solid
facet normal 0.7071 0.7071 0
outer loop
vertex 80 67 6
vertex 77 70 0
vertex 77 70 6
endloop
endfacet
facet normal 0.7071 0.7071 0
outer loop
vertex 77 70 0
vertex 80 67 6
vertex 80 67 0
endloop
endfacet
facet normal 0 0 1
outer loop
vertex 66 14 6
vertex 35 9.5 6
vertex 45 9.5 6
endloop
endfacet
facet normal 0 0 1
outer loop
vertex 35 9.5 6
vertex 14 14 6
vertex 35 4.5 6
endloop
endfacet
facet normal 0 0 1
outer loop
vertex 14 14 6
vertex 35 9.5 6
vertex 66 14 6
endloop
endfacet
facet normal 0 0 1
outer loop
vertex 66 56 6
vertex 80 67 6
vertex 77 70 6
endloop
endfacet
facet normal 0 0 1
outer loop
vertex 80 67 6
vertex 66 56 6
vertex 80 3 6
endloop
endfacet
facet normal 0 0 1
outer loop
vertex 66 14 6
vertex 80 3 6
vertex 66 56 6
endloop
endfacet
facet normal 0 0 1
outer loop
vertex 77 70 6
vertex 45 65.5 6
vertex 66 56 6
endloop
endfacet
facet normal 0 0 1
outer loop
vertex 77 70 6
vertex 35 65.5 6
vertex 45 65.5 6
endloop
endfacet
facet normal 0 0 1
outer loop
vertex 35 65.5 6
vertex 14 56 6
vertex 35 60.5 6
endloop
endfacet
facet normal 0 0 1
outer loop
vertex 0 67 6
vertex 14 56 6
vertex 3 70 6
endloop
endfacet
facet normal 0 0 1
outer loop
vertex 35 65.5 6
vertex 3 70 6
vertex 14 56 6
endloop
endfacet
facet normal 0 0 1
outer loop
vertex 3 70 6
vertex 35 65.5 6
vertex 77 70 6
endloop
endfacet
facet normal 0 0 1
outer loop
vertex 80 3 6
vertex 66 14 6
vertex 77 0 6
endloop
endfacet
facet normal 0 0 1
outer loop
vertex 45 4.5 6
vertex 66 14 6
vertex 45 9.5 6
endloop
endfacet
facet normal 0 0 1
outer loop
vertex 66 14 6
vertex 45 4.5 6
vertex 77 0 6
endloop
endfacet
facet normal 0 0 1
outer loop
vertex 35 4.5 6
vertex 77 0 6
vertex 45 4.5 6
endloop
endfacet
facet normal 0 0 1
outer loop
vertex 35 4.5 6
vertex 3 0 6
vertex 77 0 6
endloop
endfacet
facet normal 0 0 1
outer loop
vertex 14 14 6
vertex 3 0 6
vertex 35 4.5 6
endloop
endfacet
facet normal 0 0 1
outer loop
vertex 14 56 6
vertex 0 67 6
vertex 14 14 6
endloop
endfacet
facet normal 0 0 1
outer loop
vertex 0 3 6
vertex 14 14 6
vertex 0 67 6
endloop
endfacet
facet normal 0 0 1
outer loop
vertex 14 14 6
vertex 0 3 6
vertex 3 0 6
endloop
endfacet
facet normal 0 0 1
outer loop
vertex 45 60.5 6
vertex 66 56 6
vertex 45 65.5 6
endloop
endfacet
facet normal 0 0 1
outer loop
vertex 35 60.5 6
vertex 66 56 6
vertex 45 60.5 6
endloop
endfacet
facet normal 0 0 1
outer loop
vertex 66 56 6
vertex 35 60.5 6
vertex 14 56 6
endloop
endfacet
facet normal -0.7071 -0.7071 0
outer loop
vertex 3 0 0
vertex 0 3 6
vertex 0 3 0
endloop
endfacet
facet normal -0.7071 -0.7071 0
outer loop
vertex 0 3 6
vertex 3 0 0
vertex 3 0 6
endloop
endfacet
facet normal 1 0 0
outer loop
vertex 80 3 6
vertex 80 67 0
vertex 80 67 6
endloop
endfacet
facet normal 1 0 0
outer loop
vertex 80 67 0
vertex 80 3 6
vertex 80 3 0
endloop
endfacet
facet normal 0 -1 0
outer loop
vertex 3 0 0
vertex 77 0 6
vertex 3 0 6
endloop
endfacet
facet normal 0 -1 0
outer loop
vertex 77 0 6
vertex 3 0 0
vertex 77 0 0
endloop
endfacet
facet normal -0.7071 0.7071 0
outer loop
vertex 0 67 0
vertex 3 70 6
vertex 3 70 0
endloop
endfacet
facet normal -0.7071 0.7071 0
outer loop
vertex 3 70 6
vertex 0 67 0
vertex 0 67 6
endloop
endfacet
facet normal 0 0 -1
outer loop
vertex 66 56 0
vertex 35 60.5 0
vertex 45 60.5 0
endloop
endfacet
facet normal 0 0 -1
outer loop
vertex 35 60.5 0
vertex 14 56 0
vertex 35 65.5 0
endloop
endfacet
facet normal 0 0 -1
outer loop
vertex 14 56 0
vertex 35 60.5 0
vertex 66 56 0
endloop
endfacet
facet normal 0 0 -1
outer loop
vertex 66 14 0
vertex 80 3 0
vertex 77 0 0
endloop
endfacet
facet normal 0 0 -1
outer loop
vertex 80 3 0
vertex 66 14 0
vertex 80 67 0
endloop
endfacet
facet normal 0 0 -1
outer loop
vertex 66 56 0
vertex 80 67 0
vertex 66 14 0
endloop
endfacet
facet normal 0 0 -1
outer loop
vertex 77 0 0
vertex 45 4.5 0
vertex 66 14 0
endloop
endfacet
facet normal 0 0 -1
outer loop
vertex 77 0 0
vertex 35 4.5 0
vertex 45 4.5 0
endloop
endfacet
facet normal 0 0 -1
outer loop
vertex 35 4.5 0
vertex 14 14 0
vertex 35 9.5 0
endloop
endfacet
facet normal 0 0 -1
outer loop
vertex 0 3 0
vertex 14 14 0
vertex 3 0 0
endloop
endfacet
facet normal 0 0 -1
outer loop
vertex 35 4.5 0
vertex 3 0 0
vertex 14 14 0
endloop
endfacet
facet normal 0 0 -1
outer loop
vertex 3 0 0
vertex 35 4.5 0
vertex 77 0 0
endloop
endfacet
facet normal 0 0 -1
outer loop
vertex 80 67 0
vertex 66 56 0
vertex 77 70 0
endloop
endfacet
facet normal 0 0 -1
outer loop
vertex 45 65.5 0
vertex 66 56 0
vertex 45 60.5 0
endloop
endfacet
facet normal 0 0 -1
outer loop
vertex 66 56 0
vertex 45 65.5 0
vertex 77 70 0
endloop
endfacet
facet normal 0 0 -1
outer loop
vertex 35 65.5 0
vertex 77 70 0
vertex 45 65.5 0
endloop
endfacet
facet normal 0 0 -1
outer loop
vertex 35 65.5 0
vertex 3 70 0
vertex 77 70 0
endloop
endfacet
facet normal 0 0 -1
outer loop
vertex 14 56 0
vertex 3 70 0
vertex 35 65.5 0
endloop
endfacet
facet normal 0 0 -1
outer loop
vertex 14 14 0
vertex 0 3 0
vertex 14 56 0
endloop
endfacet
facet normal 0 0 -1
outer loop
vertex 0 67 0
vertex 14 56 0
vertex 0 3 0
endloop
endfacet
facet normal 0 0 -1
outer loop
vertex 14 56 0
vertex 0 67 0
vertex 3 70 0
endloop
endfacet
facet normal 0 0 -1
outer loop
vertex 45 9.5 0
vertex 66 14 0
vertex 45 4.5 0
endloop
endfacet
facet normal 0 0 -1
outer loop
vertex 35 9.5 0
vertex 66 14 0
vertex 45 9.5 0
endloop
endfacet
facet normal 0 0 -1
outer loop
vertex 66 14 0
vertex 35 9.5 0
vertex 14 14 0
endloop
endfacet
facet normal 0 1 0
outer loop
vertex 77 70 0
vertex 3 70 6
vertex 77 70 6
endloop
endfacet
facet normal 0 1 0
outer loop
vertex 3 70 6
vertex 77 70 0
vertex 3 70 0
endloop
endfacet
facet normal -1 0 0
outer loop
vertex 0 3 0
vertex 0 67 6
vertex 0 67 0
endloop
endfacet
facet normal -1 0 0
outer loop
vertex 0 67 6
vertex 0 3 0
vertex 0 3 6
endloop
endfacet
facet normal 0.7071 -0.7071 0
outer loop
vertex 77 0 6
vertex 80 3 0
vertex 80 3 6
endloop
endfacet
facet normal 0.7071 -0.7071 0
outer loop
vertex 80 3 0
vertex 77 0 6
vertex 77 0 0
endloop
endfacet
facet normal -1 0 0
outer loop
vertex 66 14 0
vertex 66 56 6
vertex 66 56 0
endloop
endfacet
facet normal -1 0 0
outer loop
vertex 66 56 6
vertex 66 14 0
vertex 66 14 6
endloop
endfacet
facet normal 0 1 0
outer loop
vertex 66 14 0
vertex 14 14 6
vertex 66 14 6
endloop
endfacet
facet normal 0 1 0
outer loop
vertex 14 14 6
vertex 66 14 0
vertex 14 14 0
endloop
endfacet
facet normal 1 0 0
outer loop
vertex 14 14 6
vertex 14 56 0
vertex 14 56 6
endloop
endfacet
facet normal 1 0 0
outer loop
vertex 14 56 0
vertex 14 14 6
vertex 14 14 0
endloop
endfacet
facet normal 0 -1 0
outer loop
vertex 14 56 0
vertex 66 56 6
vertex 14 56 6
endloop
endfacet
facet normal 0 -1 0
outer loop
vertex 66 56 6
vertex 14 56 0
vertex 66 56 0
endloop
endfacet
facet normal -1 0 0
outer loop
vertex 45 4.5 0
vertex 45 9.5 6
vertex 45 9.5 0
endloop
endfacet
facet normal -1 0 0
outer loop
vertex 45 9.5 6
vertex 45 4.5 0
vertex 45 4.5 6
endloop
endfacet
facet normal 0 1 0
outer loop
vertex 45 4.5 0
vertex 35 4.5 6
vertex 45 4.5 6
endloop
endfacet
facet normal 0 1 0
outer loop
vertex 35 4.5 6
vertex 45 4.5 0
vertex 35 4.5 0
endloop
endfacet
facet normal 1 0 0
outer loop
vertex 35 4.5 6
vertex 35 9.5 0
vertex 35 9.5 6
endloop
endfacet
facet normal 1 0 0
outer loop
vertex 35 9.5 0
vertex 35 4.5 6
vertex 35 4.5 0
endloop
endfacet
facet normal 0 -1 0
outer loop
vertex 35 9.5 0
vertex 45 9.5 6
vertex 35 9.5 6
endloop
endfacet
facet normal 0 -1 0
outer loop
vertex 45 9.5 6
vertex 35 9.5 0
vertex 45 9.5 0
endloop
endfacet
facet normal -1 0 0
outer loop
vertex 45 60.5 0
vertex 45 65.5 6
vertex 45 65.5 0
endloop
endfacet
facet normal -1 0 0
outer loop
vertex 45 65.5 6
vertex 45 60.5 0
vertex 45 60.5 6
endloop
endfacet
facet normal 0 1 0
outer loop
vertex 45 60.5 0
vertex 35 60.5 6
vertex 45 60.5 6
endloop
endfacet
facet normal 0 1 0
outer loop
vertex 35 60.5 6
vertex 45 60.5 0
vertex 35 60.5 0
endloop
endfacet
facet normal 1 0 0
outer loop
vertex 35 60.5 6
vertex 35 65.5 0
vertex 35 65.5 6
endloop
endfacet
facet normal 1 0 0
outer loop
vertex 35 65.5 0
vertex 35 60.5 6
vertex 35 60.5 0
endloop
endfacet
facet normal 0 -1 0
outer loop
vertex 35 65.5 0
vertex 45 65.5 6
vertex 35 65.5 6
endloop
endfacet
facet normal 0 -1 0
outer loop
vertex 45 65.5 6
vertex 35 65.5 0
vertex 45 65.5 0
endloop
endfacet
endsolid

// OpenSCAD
$fn = 32;

// ----------------------------------------------------------------------
// Frame plate: 80 x 70 frame, 14 mm rails
// ----------------------------------------------------------------------

// --- parameters (mm) ---
plate_l = 80;             // plate length, X
plate_w = 70;             // plate width, Y
plate_t = 6;              // plate thickness, Z (extrusion height)
corner_c = 3;             // corner chamfer
frame_bar = 14;           // frame rail width
slot_l = 10;              // adjustment slot length
slot_w = 5;               // adjustment slot width

win_l = plate_l - 2 * frame_bar;  // window length
win_w = plate_w - 2 * frame_bar;  // window width

profile = [[3, 0], [77, 0], [80, 3], [80, 67], [77, 70], [3, 70], [0, 67], [0, 3]];  // primary outline, 8 points, counter clockwise
void_1 = [[14, 14], [66, 14], [66, 56], [14, 56]];  // the window, 4 points
void_2 = [[35, 4.5], [45, 4.5], [45, 9.5], [35, 9.5]];  // adjustment slot, 4 points
void_3 = [[35, 60.5], [45, 60.5], [45, 65.5], [35, 65.5]];  // adjustment slot, 4 points

// --- the one profile operation ---
difference() {
  linear_extrude(height = plate_t) polygon(points = profile);
  translate([0, 0, -1])
    linear_extrude(height = plate_t + 2) polygon(points = void_1);
  translate([0, 0, -1])
    linear_extrude(height = plate_t + 2) polygon(points = void_2);
  translate([0, 0, -1])
    linear_extrude(height = plate_t + 2) polygon(points = void_3);
}
